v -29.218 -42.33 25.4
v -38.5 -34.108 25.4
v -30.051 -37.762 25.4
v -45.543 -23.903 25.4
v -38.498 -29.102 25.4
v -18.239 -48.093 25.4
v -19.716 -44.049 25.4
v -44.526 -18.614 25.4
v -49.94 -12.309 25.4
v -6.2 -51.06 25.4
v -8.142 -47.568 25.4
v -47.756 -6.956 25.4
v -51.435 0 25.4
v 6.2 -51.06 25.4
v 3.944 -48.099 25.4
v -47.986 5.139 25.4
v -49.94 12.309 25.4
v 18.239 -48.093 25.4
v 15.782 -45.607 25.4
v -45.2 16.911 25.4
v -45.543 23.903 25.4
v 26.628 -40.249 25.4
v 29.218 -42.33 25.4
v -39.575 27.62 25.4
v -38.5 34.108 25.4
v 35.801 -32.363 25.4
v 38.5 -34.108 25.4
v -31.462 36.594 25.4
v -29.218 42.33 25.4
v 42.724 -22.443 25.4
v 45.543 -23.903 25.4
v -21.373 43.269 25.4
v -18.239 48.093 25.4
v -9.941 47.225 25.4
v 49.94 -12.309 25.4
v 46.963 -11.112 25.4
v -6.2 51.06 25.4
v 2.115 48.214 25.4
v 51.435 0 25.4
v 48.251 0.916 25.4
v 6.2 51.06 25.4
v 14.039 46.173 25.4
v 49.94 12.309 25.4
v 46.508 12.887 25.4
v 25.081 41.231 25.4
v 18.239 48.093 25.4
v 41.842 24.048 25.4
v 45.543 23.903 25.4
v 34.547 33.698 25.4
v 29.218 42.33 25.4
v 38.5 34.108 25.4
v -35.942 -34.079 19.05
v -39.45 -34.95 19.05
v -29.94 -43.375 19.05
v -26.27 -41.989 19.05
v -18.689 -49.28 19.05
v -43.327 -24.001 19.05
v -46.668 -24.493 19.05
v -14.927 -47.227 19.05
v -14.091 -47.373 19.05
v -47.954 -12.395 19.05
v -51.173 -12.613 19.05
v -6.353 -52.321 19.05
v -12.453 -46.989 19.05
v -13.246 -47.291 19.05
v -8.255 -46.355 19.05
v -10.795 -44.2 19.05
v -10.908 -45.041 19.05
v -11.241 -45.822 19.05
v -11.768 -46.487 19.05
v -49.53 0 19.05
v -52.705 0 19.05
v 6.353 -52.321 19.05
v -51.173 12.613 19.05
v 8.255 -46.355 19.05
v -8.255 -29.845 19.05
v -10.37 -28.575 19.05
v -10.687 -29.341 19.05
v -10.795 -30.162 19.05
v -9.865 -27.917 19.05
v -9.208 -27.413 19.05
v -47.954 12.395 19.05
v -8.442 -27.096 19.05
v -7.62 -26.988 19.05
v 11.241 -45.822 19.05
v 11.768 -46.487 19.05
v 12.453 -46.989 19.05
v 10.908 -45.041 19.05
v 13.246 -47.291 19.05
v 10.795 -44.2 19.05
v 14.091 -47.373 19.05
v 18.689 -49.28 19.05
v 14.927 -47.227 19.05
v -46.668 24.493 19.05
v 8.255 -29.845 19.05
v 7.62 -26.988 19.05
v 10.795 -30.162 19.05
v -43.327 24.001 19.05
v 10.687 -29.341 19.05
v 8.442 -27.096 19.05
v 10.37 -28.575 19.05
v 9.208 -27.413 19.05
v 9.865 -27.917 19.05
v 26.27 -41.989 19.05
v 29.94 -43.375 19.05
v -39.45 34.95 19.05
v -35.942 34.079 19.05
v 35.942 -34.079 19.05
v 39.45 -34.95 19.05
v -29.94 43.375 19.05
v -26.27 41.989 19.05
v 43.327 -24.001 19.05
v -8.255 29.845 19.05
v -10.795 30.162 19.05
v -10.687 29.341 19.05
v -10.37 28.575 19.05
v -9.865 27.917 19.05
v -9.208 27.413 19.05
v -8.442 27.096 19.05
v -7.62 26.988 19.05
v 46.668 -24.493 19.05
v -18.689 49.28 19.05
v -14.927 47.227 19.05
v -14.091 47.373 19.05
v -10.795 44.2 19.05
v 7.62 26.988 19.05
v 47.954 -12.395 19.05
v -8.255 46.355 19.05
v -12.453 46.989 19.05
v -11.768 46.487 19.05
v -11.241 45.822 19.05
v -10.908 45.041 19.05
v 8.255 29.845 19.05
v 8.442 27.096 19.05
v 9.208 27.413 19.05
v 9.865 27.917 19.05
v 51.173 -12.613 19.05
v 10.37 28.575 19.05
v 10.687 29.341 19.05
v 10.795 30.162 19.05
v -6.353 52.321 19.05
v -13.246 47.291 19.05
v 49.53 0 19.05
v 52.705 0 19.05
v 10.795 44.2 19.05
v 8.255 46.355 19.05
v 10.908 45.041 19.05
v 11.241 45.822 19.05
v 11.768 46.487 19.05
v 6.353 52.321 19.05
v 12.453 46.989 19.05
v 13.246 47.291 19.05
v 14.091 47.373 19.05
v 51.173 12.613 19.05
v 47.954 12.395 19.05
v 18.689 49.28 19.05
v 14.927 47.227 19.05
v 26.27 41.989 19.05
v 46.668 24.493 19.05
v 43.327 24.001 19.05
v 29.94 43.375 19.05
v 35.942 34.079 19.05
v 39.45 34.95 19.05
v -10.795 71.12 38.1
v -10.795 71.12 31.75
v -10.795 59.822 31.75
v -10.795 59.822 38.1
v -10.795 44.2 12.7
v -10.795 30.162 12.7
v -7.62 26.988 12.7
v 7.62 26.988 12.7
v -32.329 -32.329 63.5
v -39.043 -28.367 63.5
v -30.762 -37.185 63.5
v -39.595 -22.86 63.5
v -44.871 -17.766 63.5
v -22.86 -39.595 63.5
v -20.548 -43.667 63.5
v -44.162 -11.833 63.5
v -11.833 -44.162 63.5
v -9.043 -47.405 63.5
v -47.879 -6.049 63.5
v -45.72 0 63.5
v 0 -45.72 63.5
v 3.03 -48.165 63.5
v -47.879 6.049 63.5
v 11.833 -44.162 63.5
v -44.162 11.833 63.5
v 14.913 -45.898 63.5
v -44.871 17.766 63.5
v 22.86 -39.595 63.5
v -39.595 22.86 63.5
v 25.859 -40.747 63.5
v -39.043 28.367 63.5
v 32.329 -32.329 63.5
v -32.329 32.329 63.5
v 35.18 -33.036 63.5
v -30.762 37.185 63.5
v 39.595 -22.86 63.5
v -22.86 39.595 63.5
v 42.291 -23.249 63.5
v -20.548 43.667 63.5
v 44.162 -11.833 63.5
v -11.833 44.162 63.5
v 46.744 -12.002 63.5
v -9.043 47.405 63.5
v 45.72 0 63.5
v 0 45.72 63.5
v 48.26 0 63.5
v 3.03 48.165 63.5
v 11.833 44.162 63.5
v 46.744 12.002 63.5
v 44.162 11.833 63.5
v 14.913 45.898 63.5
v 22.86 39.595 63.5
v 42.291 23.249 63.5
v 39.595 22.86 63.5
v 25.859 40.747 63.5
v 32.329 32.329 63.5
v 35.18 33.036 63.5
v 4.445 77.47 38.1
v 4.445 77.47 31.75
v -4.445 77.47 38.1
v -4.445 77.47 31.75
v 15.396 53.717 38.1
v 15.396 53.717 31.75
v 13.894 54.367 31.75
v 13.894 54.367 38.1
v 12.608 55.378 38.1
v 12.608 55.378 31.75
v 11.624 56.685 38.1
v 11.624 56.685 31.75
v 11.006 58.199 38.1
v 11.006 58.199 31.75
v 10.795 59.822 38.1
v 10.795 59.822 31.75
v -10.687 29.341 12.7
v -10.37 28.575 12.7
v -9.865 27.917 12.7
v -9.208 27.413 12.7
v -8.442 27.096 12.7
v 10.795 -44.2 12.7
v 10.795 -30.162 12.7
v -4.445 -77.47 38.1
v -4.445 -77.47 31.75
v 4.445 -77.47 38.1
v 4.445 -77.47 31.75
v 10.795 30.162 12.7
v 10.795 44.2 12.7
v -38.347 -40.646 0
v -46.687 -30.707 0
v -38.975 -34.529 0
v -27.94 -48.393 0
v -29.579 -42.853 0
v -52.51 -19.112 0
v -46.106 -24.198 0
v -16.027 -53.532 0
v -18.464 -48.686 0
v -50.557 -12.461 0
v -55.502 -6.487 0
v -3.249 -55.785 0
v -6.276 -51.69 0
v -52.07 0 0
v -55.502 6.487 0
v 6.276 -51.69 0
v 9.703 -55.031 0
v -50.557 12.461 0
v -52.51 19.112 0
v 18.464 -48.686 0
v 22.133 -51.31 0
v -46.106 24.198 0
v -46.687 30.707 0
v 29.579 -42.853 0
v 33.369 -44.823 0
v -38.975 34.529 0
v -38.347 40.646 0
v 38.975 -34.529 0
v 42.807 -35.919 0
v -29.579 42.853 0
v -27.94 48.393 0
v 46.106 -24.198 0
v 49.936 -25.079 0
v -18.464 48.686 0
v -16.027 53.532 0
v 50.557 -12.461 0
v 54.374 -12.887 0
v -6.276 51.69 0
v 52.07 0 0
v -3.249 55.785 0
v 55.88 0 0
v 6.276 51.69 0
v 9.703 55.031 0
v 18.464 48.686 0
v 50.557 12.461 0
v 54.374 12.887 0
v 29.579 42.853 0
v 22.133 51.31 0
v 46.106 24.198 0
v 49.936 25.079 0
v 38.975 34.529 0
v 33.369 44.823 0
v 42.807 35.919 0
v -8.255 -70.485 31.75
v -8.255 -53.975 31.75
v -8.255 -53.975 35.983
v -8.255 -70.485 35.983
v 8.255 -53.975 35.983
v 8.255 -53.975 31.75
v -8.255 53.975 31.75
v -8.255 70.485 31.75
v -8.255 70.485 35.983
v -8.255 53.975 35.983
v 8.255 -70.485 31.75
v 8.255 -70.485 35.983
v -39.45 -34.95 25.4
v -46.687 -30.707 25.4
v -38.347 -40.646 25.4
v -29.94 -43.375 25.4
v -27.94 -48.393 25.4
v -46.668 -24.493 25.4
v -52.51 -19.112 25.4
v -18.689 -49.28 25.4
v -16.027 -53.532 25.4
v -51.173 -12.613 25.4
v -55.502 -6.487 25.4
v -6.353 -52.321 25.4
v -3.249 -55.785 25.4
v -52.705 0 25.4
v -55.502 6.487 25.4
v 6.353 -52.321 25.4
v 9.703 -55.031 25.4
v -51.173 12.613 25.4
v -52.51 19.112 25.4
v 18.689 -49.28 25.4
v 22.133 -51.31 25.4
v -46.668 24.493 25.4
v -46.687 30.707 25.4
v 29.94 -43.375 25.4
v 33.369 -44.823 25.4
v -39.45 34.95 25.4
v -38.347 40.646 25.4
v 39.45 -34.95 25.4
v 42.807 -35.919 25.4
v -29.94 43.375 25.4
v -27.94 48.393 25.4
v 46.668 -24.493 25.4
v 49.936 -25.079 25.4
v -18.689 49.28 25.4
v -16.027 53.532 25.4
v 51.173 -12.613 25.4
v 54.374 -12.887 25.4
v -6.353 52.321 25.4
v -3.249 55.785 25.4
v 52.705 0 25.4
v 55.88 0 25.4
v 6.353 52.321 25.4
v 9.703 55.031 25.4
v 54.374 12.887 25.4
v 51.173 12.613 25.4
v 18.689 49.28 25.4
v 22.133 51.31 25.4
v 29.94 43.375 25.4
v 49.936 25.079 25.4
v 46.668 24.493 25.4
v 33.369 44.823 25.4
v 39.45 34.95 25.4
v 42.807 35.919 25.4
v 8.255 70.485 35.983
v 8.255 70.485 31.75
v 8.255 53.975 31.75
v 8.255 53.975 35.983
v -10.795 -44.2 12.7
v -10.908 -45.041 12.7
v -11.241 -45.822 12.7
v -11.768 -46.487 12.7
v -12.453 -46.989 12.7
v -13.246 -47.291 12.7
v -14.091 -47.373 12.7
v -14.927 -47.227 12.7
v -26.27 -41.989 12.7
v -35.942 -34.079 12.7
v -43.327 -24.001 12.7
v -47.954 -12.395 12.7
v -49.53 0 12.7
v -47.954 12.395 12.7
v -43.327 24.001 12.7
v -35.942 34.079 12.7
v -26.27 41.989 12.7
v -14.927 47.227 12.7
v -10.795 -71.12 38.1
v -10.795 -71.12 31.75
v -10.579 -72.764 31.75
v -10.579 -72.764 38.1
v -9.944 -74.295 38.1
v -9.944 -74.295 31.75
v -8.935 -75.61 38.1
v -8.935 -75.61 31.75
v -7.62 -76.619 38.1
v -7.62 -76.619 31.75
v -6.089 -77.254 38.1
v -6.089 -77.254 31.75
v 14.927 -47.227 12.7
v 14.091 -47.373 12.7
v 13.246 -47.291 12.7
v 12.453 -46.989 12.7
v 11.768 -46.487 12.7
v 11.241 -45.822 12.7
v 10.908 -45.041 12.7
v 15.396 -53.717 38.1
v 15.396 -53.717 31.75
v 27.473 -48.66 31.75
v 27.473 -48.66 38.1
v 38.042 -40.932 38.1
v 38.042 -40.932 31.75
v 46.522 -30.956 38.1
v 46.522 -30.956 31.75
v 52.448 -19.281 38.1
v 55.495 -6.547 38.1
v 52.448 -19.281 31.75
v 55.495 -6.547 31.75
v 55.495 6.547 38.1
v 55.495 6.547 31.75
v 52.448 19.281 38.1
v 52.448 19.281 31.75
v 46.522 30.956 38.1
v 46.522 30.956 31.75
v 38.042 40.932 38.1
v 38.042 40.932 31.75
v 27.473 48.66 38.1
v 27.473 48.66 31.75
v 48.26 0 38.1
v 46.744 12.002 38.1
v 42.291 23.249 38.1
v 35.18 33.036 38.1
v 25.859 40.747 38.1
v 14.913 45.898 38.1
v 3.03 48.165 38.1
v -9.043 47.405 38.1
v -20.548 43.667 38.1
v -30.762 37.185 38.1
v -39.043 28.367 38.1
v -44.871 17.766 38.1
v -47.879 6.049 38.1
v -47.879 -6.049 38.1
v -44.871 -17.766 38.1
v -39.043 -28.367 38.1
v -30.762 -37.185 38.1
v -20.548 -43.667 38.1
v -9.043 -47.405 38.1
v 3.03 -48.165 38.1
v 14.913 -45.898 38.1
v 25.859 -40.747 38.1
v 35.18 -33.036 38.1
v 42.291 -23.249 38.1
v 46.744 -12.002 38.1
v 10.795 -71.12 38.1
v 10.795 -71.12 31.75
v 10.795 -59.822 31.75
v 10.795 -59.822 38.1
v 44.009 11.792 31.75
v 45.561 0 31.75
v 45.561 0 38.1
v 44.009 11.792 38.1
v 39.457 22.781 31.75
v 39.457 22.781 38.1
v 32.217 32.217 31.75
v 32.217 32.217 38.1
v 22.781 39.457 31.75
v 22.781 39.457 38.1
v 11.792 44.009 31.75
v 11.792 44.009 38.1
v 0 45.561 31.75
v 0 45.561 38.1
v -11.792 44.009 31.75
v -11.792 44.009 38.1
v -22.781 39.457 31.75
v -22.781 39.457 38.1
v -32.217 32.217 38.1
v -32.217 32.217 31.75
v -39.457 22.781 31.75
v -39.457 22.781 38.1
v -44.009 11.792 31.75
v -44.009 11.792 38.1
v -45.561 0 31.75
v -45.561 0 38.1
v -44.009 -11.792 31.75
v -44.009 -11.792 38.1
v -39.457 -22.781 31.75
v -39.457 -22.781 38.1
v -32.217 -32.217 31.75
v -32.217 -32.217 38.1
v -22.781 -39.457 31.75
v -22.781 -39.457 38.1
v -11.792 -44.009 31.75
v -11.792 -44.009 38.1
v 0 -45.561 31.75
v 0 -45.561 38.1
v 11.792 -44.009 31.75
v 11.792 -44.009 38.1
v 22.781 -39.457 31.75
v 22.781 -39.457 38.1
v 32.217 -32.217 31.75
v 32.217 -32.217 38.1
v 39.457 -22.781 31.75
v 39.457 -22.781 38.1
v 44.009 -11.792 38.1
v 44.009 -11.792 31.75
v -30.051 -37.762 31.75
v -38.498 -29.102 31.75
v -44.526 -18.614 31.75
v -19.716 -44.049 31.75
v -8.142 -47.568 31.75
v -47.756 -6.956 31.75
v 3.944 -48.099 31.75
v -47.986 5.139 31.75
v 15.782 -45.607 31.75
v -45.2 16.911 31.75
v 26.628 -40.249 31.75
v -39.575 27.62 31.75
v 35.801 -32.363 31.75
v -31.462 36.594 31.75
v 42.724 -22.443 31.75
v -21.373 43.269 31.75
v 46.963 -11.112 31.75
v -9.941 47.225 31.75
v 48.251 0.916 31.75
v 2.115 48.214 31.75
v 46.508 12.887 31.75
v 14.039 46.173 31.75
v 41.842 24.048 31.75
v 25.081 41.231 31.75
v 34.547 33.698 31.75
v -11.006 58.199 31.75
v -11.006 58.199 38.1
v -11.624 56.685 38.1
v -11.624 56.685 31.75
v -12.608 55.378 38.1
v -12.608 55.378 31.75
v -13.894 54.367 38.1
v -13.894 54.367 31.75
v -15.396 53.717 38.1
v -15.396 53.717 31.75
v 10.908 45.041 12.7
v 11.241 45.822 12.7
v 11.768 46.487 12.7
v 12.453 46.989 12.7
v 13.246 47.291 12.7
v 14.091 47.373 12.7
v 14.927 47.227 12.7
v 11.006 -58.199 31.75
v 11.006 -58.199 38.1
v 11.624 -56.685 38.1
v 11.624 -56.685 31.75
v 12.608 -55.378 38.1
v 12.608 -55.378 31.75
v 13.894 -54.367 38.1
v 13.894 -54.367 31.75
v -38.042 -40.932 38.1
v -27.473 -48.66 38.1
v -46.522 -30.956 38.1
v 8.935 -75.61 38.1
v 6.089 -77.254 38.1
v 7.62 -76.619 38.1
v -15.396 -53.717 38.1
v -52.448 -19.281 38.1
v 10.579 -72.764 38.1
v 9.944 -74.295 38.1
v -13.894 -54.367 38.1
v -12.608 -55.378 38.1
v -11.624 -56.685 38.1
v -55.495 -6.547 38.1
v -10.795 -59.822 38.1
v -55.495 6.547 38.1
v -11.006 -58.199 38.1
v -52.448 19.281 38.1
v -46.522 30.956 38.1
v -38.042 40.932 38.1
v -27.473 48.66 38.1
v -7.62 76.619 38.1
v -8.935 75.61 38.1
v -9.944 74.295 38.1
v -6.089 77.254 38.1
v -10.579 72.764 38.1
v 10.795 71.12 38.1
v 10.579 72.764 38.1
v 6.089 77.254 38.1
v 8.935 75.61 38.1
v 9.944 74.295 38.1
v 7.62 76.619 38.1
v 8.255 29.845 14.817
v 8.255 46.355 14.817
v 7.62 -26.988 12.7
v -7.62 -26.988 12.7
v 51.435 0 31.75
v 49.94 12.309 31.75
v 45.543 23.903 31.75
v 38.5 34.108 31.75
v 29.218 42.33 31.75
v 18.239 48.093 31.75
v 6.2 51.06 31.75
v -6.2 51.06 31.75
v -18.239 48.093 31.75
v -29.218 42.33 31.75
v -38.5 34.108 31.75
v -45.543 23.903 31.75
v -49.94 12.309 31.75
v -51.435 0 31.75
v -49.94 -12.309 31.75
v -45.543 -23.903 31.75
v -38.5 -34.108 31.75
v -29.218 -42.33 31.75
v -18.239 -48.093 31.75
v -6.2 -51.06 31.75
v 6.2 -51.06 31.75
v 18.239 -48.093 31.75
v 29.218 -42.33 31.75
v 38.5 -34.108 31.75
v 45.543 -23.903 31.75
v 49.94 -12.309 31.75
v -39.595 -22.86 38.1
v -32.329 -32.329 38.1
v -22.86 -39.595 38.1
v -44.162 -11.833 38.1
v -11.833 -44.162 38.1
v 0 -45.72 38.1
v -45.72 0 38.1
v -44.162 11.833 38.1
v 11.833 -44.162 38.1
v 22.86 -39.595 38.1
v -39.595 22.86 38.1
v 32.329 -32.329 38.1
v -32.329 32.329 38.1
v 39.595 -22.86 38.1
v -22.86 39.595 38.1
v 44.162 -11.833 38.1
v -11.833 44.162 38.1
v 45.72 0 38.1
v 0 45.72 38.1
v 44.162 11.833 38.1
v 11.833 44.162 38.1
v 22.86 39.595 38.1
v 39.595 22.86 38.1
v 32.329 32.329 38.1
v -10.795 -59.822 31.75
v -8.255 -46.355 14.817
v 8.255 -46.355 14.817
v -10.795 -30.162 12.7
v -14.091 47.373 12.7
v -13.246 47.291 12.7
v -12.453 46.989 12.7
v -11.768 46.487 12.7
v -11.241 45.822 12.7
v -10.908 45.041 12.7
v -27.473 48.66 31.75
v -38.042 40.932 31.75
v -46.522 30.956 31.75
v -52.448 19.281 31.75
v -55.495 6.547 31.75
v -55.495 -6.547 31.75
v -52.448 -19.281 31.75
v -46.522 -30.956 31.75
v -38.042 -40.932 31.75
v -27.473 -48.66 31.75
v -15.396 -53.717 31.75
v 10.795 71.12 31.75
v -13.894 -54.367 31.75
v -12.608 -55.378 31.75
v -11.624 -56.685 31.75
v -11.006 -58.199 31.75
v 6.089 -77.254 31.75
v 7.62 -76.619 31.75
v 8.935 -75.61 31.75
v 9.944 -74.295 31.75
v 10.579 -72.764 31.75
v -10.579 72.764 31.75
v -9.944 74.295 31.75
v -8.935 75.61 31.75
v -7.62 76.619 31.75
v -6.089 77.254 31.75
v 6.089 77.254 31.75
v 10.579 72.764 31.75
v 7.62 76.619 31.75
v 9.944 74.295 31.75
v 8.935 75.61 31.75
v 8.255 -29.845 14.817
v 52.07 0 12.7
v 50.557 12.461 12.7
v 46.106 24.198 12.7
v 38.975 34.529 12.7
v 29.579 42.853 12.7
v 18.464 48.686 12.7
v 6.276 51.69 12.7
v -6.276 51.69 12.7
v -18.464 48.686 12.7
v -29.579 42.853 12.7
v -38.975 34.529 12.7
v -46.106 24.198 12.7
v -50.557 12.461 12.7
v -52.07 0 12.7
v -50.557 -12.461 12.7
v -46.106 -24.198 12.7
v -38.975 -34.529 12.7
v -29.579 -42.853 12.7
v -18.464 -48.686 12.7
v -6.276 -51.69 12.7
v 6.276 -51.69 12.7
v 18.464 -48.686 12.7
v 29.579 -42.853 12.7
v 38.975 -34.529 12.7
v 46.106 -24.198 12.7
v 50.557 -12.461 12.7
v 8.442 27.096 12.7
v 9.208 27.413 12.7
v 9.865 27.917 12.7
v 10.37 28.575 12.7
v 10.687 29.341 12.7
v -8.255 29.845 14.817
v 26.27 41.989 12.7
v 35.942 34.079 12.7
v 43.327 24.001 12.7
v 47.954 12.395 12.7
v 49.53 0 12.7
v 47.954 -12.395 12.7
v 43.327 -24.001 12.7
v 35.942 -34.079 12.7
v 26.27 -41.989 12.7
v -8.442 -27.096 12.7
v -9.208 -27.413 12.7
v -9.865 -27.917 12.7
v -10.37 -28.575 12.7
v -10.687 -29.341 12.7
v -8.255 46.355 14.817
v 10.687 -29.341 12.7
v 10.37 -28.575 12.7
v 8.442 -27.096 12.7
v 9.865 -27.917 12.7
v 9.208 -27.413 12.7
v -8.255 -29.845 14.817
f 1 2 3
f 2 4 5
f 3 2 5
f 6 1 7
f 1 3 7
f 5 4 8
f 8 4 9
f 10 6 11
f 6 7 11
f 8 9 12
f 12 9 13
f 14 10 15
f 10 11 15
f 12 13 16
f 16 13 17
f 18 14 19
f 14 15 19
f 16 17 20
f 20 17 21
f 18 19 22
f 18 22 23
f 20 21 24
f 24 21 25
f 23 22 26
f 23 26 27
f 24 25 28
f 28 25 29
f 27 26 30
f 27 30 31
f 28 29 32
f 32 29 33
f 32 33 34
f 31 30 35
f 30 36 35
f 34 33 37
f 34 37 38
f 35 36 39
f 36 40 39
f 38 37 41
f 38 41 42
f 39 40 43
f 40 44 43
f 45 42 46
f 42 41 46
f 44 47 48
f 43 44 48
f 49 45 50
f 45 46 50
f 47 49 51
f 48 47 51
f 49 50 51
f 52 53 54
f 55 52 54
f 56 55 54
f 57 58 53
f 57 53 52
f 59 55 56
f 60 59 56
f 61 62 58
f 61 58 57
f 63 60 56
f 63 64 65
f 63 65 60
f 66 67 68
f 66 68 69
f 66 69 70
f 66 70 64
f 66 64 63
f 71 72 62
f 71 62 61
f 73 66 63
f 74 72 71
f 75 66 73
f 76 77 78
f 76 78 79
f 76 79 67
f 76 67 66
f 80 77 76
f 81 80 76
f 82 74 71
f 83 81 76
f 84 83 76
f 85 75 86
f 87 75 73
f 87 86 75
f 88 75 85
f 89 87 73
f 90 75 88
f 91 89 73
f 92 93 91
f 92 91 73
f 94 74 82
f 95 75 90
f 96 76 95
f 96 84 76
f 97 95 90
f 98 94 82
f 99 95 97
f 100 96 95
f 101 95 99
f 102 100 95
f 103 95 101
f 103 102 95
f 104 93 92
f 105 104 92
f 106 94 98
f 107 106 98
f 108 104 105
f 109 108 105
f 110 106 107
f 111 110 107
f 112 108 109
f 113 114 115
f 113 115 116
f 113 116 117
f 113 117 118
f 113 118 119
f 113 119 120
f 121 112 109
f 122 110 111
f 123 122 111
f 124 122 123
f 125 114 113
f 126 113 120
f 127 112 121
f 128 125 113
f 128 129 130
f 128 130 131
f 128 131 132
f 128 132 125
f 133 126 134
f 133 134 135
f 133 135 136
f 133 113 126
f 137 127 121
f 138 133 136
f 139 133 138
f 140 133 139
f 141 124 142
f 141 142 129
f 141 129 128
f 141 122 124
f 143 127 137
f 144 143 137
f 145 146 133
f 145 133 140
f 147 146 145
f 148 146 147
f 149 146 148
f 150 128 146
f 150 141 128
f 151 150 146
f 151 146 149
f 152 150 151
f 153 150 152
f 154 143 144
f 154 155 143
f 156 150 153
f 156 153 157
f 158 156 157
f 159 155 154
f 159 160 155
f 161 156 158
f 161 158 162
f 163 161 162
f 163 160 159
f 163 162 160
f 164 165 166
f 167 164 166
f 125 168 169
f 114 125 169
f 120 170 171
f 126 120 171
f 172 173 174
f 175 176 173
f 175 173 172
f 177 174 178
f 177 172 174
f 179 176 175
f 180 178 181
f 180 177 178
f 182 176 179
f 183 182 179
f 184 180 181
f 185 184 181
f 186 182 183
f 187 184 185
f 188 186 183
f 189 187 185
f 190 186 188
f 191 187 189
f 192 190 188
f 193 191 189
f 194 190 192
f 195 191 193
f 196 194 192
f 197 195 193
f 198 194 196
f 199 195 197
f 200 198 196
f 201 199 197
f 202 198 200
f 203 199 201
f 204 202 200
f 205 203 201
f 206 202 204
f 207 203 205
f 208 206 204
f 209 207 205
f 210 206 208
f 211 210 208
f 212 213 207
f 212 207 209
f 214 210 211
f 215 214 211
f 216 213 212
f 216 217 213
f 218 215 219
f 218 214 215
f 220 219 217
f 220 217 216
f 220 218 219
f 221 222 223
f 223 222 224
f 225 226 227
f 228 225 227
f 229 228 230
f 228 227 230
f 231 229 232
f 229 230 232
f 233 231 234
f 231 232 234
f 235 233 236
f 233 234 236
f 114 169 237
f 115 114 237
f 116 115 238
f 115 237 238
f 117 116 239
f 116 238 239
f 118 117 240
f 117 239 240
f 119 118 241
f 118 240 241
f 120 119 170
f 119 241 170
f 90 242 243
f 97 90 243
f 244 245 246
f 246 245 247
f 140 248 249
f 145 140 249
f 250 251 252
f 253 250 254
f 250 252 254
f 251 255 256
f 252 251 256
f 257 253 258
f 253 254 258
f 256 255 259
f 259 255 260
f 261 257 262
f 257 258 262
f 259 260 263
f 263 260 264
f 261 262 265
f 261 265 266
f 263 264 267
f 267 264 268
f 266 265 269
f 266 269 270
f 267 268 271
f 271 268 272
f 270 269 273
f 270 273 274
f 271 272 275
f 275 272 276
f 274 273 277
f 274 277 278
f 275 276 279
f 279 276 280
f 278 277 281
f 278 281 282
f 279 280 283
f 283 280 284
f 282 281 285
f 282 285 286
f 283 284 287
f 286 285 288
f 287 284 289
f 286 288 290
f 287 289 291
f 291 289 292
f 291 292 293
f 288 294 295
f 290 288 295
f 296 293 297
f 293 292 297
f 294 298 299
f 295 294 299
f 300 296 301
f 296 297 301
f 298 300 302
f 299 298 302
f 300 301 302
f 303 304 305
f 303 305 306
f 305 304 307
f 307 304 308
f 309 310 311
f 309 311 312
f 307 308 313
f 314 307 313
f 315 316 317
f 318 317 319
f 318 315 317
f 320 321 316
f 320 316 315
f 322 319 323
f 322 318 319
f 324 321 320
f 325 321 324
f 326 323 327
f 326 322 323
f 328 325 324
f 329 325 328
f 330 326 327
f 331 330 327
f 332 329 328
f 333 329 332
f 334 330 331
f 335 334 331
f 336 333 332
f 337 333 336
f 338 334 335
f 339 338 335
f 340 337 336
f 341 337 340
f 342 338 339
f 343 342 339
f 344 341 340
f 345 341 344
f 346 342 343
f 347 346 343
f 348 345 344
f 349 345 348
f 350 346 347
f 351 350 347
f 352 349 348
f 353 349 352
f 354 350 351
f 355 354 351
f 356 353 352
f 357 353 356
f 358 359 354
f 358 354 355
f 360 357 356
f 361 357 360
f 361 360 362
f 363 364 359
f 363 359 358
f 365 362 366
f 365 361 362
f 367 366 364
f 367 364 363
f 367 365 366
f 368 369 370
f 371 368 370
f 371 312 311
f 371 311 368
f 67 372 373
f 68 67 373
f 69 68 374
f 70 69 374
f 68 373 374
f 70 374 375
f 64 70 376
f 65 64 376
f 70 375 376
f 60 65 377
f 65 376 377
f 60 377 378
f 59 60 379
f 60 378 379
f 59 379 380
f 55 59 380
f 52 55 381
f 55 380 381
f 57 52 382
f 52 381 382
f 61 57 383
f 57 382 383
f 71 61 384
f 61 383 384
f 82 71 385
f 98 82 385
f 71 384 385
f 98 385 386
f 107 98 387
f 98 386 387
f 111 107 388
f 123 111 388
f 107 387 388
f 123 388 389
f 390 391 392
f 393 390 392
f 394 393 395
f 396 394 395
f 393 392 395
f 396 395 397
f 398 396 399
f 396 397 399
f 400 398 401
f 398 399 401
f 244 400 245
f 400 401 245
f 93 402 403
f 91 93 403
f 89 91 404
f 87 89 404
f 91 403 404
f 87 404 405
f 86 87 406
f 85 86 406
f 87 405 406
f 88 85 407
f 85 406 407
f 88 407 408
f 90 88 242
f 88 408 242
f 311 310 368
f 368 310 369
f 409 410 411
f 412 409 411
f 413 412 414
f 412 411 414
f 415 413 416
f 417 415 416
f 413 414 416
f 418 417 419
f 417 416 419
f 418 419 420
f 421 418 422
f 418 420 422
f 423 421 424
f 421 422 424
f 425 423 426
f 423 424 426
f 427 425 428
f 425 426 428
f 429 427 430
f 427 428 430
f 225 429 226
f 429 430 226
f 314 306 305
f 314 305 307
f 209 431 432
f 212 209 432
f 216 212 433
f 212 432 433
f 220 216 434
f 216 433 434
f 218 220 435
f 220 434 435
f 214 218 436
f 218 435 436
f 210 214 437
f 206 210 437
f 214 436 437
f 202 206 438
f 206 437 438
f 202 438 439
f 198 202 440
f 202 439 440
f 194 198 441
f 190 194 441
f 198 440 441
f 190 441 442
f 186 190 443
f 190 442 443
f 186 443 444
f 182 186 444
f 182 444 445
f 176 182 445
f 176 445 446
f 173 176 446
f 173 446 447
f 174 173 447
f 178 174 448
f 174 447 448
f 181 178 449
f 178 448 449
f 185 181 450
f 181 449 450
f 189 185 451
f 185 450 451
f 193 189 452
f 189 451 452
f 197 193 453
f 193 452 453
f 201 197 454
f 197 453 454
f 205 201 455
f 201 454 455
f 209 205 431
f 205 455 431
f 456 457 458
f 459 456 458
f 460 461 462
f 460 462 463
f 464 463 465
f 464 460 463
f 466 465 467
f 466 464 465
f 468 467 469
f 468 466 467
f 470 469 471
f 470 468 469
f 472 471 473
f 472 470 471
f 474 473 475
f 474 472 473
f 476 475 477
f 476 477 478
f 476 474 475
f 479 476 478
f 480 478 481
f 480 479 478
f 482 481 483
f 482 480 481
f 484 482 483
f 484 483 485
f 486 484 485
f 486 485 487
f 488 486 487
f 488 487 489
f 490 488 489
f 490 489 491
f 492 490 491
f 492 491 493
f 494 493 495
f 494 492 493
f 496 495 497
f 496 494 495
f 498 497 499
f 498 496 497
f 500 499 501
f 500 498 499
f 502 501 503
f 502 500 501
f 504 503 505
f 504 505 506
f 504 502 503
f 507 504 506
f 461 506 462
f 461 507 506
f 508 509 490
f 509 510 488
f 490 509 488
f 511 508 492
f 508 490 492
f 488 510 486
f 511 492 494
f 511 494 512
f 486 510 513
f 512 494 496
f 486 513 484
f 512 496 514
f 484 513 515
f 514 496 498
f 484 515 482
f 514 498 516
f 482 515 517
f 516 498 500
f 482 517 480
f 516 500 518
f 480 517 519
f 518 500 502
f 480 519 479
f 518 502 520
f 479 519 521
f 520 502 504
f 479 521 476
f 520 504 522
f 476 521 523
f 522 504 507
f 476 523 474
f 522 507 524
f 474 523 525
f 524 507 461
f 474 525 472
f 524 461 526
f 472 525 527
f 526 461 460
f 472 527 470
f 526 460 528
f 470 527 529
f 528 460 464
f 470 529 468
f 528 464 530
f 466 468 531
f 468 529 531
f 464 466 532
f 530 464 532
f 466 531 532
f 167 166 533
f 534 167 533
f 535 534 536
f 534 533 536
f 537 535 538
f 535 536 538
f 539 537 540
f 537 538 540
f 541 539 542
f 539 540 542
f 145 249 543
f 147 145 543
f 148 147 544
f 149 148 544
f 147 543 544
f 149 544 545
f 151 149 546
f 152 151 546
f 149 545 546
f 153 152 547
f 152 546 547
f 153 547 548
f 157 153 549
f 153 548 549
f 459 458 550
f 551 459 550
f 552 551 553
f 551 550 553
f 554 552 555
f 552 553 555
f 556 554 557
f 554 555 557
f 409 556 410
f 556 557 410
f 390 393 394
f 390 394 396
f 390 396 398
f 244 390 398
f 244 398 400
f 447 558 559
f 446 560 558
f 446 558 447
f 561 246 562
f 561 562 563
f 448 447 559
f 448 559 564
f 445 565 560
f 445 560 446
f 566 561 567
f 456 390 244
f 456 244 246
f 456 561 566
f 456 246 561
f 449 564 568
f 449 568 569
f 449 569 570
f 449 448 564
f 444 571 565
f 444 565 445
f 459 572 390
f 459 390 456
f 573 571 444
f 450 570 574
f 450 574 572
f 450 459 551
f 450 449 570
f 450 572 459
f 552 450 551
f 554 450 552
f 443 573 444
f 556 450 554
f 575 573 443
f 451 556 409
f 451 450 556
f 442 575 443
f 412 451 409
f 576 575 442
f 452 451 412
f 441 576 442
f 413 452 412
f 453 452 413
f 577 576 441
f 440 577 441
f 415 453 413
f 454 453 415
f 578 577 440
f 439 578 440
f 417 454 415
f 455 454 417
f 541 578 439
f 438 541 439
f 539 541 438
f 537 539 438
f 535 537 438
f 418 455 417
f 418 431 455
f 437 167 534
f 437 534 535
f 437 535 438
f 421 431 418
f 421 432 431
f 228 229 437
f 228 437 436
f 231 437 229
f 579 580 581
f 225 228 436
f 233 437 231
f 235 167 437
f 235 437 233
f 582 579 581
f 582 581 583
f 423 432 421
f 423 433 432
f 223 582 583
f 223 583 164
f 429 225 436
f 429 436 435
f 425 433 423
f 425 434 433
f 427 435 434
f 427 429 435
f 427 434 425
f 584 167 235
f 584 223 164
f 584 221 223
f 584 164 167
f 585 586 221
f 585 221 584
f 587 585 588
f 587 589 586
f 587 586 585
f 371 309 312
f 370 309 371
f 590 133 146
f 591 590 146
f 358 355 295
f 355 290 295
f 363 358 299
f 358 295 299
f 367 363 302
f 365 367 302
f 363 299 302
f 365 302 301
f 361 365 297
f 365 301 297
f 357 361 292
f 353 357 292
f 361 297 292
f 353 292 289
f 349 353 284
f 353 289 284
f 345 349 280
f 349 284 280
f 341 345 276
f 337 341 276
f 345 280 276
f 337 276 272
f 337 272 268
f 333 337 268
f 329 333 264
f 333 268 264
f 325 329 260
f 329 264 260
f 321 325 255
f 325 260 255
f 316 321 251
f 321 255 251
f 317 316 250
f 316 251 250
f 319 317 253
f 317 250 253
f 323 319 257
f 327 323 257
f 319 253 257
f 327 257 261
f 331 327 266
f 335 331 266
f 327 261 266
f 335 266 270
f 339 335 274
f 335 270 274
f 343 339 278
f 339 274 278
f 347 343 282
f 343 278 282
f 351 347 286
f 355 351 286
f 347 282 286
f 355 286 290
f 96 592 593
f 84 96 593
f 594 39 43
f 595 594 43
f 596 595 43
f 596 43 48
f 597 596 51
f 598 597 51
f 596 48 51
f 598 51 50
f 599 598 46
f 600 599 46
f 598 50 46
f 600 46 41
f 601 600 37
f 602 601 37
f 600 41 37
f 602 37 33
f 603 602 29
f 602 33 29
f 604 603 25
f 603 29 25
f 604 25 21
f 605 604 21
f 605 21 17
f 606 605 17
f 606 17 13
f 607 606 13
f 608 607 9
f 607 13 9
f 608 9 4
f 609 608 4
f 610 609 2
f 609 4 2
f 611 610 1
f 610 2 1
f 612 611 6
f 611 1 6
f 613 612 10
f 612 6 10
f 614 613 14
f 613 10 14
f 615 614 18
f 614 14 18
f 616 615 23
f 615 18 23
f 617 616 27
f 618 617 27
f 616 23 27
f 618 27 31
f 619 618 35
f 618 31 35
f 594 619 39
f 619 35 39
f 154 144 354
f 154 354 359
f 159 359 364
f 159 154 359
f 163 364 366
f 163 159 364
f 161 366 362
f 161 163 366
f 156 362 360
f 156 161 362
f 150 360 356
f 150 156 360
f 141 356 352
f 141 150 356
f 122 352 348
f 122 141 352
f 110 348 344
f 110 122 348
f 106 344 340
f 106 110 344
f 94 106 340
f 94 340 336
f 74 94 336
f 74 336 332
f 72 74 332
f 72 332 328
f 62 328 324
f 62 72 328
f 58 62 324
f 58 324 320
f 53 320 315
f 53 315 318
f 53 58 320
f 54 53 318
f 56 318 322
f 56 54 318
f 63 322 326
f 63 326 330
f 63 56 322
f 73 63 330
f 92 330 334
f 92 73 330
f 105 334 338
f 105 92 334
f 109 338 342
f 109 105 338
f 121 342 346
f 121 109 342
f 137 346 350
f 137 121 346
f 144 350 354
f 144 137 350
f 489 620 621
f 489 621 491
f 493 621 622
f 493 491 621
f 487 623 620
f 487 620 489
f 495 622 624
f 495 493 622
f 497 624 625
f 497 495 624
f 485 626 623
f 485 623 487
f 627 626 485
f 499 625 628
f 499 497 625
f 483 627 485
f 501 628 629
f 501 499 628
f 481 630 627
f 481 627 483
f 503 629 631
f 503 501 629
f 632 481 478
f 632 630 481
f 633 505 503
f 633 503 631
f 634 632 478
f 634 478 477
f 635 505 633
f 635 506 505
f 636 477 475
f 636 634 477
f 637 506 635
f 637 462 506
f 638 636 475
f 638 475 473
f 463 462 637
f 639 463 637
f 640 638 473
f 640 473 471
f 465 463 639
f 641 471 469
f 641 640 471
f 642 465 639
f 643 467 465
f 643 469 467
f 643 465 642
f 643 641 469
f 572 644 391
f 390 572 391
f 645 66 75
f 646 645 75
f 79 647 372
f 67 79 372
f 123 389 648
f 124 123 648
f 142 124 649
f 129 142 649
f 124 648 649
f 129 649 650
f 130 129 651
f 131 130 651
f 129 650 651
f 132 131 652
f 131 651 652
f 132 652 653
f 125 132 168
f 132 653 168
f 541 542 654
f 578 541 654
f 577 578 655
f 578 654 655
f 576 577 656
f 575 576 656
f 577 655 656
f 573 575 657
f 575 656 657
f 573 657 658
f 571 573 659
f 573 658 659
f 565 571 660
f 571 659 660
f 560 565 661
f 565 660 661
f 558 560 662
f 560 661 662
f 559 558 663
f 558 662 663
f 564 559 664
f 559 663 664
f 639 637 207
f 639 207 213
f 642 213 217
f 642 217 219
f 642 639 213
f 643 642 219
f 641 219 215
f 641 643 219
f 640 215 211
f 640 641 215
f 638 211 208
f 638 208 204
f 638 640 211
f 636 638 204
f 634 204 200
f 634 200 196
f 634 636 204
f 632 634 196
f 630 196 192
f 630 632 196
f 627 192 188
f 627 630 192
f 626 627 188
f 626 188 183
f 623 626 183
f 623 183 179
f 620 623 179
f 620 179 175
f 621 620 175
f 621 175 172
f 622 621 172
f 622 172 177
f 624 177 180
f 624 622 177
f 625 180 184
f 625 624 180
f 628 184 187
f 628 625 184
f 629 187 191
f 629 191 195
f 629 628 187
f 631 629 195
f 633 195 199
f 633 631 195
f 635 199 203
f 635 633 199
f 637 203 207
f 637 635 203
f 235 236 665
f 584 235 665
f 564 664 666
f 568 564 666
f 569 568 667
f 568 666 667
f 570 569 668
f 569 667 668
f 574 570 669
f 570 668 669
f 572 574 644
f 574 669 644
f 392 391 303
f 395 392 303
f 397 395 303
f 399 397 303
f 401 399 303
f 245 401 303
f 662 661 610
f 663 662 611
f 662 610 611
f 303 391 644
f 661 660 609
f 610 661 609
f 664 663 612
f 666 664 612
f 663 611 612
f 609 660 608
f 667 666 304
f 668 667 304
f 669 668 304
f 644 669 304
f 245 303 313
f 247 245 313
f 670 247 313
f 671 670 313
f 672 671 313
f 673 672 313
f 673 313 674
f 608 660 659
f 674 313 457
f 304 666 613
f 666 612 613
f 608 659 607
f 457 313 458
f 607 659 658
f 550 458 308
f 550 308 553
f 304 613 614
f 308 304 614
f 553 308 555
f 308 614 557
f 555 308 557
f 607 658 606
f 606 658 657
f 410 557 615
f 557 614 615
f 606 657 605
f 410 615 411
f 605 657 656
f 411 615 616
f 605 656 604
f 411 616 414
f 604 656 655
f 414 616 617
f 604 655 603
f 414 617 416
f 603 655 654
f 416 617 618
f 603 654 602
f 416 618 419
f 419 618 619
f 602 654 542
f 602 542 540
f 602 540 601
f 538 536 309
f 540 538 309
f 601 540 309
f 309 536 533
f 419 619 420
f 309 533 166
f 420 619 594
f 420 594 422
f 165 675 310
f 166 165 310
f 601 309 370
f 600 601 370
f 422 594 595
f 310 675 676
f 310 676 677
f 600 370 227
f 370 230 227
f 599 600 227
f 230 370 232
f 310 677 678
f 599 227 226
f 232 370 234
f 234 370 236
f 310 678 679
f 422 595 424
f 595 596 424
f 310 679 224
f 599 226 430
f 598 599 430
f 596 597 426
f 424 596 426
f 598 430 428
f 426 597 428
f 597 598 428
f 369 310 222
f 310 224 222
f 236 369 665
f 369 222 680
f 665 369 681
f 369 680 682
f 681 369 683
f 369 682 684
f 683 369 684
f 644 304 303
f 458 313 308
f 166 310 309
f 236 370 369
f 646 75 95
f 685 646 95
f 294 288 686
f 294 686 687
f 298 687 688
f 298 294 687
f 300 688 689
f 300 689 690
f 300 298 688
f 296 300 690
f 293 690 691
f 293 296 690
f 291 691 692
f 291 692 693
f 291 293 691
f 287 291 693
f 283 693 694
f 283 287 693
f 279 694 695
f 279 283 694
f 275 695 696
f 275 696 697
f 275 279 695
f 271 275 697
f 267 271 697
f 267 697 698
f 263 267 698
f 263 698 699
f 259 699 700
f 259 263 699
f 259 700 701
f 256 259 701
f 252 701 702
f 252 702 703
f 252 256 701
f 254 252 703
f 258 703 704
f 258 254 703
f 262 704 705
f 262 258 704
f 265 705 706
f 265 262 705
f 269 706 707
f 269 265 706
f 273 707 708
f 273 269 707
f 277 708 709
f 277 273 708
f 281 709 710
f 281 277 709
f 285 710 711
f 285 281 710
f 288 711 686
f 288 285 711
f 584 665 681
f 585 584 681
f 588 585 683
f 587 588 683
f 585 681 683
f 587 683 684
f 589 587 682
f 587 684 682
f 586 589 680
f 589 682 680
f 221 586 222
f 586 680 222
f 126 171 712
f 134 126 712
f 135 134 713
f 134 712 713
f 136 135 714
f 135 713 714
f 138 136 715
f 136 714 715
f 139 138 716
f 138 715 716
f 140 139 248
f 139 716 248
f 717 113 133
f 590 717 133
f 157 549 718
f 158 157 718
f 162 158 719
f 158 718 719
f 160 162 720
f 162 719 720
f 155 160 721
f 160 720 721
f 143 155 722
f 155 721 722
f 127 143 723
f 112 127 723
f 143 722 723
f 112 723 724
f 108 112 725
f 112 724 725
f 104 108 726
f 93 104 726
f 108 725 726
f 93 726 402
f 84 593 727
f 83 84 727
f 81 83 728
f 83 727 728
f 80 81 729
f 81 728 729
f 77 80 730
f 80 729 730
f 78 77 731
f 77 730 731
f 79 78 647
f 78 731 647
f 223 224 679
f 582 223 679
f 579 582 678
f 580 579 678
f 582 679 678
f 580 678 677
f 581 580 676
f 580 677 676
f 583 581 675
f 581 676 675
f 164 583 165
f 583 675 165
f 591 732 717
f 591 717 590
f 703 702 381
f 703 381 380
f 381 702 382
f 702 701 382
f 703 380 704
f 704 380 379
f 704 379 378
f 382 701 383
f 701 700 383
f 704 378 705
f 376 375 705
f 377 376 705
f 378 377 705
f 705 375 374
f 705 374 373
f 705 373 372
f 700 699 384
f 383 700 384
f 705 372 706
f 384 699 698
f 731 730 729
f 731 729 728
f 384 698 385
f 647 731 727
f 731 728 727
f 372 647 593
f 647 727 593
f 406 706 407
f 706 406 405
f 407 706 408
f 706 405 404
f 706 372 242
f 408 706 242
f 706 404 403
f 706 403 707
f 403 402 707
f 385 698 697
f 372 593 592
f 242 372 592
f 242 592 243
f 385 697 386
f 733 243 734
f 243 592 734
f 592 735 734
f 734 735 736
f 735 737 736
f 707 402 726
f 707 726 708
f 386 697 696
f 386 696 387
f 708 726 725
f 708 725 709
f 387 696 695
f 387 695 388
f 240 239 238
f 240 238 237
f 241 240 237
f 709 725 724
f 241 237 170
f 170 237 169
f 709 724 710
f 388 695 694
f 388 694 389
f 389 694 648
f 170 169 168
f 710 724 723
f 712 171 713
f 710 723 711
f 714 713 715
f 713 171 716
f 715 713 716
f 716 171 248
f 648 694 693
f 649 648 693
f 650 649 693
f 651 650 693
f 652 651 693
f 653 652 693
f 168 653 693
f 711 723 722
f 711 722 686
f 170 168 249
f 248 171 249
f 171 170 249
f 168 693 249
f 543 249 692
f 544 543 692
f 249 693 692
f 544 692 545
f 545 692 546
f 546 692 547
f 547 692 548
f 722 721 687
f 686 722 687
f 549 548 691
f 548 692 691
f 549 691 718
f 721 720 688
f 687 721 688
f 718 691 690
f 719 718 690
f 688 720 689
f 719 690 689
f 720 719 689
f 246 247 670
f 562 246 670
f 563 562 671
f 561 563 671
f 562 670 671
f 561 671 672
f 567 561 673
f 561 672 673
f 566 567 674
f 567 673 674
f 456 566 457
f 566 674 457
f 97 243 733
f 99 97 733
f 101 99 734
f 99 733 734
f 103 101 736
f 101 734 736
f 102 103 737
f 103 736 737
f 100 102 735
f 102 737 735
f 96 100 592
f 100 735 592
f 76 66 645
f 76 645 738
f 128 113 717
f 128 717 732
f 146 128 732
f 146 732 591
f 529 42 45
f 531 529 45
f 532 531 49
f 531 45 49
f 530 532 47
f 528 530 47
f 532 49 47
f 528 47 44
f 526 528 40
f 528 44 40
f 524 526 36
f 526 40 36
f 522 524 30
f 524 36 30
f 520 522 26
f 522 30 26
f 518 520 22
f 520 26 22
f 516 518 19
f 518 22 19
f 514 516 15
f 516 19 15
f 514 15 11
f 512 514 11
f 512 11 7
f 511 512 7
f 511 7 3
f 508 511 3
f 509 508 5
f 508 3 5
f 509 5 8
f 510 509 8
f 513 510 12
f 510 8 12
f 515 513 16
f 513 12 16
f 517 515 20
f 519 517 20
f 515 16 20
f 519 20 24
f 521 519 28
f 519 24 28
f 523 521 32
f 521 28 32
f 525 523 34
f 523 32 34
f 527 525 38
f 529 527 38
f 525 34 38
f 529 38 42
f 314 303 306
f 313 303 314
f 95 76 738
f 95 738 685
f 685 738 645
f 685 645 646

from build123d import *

# Parameters (mm, degrees)
F0_R      = 55.88
F0_R_2    = 52.07
F1_DEPTH  = 12.7
F2_R      = 55.88
F3_DEPTH  = 6.35
F4_R      = 55.88
F4_R_2    = 52.705
F5_DEPTH  = 6.35
F6_W      = 16.51
F6_H      = 16.51
F7_DEPTH  = 4.2333333333
F8_R      = 51.435
F9_DEPTH  = 6.35
F10_R     = 45.56125
F11_DEPTH = 6.35
F12_R     = 48.26
F12_R_2   = 45.72
F13_DEPTH = 25.4
F14_W     = 16.51
F14_H     = 16.51
F15_DEPTH = 4.2333333333


# Not quite as in the source:
# - a length typed as a fraction of an inch, garbled in the dataset ("3 / 203.2 mm" for 3/8 in), is restored


with BuildPart() as f1:
    # F0 (on Top) → F1 (new body)
    with BuildSketch(Plane.XY):
        Circle(F0_R)
        Circle(F0_R_2, mode=Mode.SUBTRACT)
    extrude(amount=F1_DEPTH)

    # F2 (on face) → F3 (join)
    with BuildSketch(Plane.XY.offset(12.7)):
        Circle(F2_R)
        with BuildLine():
            ThreePointArc((-14.9268493151, -47.2272174654), (-49.53, 0), (-14.9268493151, 47.2272174654))
            ThreePointArc((-14.9268493151, 47.2272174654), (-12.09348349, 46.7609468758), (-10.795, 44.1998317304))
            Line((-10.795, 44.1998317304), (-10.795, 30.1625))
            ThreePointArc((-10.795, 30.1625), (-9.8650640303, 27.9174359697), (-7.62, 26.9875))
            Line((-7.62, 26.9875), (7.62, 26.9875))
            ThreePointArc((7.62, 26.9875), (9.8650640303, 27.9174359697), (10.795, 30.1625))
            Line((10.795, 30.1625), (10.795, 44.1998317304))
            ThreePointArc((10.795, 44.1998317304), (12.09348349, 46.7609468758), (14.9268493151, 47.2272174654))
            ThreePointArc((14.9268493151, 47.2272174654), (49.53, 0), (14.9268493151, -47.2272174654))
            ThreePointArc((14.9268493151, -47.2272174654), (12.09348349, -46.7609468758), (10.795, -44.1998317304))
            Line((10.795, -44.1998317304), (10.795, -30.1625))
            ThreePointArc((10.795, -30.1625), (9.8650640303, -27.9174359697), (7.62, -26.9875))
            Line((7.62, -26.9875), (-7.62, -26.9875))
            ThreePointArc((-7.62, -26.9875), (-9.8650640303, -27.9174359697), (-10.795, -30.1625))
            Line((-10.795, -30.1625), (-10.795, -44.1998317304))
            ThreePointArc((-10.795, -44.1998317304), (-12.09348349, -46.7609468758), (-14.9268493151, -47.2272174654))
        make_face(mode=Mode.SUBTRACT)
    extrude(amount=F3_DEPTH)

    # F4 (on face) → F5 (join)
    with BuildSketch(Plane.XY.offset(19.05)):
        Circle(F4_R)
        Circle(F4_R_2, mode=Mode.SUBTRACT)
    extrude(amount=F5_DEPTH)

    # F6 (on face) → F7 (cut)
    with BuildSketch(Plane.XY.offset(19.05)):
        with Locations((0, 38.1)):
            Rectangle(F6_W, F6_H)
        with Locations((0, -38.1)):
            Rectangle(F6_W, F6_H)
    extrude(amount=-F7_DEPTH, mode=Mode.SUBTRACT)


with BuildPart() as f9:
    # F8 (on face) → F9 (new body)
    with BuildSketch(Plane.XY.offset(25.4)):
        Circle(F8_R)
        with BuildLine():
            ThreePointArc((15.905917603, -45.5634654653), (-48.2500123369, -0.9817889236), (14.0392727273, 46.1727887537))
            ThreePointArc((14.0392727273, 46.1727887537), (48.2500123369, 0.9817889236), (15.905917603, -45.5634654653))
        make_face(mode=Mode.SUBTRACT)
    extrude(amount=F9_DEPTH)

    # F10 (on face) → F11 (join)
    with BuildSketch(Plane.XY.offset(31.75)):
        with BuildLine():
            ThreePointArc((-10.795, 59.8215836885), (-12.0739172653, 55.9997228985), (-15.3955102041, 53.717340455))
            ThreePointArc((-15.3955102041, 53.717340455), (-55.88, 0), (-15.3955102041, -53.717340455))
            ThreePointArc((-15.3955102041, -53.717340455), (-12.0739172653, -55.9997228985), (-10.795, -59.8215836885))
            Line((-10.795, -59.8215836885), (-10.795, -71.12))
            ThreePointArc((-10.795, -71.12), (-8.9351280605, -75.6101280605), (-4.445, -77.47))
            Line((-4.445, -77.47), (4.445, -77.47))
            ThreePointArc((4.445, -77.47), (8.9351280605, -75.6101280605), (10.795, -71.12))
            Line((10.795, -71.12), (10.795, -59.8215836885))
            ThreePointArc((10.795, -59.8215836885), (12.0739172653, -55.9997228985), (15.3955102041, -53.717340455))
            ThreePointArc((15.3955102041, -53.717340455), (55.88, 0), (15.3955102041, 53.717340455))
            ThreePointArc((15.3955102041, 53.717340455), (12.0739172653, 55.9997228985), (10.795, 59.8215836885))
            Line((10.795, 59.8215836885), (10.795, 71.12))
            ThreePointArc((10.795, 71.12), (8.9351280605, 75.6101280605), (4.445, 77.47))
            Line((4.445, 77.47), (-4.445, 77.47))
            ThreePointArc((-4.445, 77.47), (-8.9351280605, 75.6101280605), (-10.795, 71.12))
            Line((-10.795, 71.12), (-10.795, 59.8215836885))
        make_face()
        Circle(F10_R, mode=Mode.SUBTRACT)
    extrude(amount=F11_DEPTH)

    # F12 (on face) → F13 (join)
    with BuildSketch(Plane.XY.offset(38.1)):
        Circle(F12_R)
        Circle(F12_R_2, mode=Mode.SUBTRACT)
    extrude(amount=F13_DEPTH)

    # F14 (on face) → F15 (cut)
    with BuildSketch(Plane(origin=(0, 0, 31.75), x_dir=(1, 0, 0), z_dir=(0, 0, -1))):
        with Locations((0, -62.23)):
            Rectangle(F14_W, F14_H)
        with Locations((0, 62.23)):
            Rectangle(F14_W, F14_H)
    extrude(amount=-F15_DEPTH, mode=Mode.SUBTRACT)


solid = Compound([f1.part, f9.part])
